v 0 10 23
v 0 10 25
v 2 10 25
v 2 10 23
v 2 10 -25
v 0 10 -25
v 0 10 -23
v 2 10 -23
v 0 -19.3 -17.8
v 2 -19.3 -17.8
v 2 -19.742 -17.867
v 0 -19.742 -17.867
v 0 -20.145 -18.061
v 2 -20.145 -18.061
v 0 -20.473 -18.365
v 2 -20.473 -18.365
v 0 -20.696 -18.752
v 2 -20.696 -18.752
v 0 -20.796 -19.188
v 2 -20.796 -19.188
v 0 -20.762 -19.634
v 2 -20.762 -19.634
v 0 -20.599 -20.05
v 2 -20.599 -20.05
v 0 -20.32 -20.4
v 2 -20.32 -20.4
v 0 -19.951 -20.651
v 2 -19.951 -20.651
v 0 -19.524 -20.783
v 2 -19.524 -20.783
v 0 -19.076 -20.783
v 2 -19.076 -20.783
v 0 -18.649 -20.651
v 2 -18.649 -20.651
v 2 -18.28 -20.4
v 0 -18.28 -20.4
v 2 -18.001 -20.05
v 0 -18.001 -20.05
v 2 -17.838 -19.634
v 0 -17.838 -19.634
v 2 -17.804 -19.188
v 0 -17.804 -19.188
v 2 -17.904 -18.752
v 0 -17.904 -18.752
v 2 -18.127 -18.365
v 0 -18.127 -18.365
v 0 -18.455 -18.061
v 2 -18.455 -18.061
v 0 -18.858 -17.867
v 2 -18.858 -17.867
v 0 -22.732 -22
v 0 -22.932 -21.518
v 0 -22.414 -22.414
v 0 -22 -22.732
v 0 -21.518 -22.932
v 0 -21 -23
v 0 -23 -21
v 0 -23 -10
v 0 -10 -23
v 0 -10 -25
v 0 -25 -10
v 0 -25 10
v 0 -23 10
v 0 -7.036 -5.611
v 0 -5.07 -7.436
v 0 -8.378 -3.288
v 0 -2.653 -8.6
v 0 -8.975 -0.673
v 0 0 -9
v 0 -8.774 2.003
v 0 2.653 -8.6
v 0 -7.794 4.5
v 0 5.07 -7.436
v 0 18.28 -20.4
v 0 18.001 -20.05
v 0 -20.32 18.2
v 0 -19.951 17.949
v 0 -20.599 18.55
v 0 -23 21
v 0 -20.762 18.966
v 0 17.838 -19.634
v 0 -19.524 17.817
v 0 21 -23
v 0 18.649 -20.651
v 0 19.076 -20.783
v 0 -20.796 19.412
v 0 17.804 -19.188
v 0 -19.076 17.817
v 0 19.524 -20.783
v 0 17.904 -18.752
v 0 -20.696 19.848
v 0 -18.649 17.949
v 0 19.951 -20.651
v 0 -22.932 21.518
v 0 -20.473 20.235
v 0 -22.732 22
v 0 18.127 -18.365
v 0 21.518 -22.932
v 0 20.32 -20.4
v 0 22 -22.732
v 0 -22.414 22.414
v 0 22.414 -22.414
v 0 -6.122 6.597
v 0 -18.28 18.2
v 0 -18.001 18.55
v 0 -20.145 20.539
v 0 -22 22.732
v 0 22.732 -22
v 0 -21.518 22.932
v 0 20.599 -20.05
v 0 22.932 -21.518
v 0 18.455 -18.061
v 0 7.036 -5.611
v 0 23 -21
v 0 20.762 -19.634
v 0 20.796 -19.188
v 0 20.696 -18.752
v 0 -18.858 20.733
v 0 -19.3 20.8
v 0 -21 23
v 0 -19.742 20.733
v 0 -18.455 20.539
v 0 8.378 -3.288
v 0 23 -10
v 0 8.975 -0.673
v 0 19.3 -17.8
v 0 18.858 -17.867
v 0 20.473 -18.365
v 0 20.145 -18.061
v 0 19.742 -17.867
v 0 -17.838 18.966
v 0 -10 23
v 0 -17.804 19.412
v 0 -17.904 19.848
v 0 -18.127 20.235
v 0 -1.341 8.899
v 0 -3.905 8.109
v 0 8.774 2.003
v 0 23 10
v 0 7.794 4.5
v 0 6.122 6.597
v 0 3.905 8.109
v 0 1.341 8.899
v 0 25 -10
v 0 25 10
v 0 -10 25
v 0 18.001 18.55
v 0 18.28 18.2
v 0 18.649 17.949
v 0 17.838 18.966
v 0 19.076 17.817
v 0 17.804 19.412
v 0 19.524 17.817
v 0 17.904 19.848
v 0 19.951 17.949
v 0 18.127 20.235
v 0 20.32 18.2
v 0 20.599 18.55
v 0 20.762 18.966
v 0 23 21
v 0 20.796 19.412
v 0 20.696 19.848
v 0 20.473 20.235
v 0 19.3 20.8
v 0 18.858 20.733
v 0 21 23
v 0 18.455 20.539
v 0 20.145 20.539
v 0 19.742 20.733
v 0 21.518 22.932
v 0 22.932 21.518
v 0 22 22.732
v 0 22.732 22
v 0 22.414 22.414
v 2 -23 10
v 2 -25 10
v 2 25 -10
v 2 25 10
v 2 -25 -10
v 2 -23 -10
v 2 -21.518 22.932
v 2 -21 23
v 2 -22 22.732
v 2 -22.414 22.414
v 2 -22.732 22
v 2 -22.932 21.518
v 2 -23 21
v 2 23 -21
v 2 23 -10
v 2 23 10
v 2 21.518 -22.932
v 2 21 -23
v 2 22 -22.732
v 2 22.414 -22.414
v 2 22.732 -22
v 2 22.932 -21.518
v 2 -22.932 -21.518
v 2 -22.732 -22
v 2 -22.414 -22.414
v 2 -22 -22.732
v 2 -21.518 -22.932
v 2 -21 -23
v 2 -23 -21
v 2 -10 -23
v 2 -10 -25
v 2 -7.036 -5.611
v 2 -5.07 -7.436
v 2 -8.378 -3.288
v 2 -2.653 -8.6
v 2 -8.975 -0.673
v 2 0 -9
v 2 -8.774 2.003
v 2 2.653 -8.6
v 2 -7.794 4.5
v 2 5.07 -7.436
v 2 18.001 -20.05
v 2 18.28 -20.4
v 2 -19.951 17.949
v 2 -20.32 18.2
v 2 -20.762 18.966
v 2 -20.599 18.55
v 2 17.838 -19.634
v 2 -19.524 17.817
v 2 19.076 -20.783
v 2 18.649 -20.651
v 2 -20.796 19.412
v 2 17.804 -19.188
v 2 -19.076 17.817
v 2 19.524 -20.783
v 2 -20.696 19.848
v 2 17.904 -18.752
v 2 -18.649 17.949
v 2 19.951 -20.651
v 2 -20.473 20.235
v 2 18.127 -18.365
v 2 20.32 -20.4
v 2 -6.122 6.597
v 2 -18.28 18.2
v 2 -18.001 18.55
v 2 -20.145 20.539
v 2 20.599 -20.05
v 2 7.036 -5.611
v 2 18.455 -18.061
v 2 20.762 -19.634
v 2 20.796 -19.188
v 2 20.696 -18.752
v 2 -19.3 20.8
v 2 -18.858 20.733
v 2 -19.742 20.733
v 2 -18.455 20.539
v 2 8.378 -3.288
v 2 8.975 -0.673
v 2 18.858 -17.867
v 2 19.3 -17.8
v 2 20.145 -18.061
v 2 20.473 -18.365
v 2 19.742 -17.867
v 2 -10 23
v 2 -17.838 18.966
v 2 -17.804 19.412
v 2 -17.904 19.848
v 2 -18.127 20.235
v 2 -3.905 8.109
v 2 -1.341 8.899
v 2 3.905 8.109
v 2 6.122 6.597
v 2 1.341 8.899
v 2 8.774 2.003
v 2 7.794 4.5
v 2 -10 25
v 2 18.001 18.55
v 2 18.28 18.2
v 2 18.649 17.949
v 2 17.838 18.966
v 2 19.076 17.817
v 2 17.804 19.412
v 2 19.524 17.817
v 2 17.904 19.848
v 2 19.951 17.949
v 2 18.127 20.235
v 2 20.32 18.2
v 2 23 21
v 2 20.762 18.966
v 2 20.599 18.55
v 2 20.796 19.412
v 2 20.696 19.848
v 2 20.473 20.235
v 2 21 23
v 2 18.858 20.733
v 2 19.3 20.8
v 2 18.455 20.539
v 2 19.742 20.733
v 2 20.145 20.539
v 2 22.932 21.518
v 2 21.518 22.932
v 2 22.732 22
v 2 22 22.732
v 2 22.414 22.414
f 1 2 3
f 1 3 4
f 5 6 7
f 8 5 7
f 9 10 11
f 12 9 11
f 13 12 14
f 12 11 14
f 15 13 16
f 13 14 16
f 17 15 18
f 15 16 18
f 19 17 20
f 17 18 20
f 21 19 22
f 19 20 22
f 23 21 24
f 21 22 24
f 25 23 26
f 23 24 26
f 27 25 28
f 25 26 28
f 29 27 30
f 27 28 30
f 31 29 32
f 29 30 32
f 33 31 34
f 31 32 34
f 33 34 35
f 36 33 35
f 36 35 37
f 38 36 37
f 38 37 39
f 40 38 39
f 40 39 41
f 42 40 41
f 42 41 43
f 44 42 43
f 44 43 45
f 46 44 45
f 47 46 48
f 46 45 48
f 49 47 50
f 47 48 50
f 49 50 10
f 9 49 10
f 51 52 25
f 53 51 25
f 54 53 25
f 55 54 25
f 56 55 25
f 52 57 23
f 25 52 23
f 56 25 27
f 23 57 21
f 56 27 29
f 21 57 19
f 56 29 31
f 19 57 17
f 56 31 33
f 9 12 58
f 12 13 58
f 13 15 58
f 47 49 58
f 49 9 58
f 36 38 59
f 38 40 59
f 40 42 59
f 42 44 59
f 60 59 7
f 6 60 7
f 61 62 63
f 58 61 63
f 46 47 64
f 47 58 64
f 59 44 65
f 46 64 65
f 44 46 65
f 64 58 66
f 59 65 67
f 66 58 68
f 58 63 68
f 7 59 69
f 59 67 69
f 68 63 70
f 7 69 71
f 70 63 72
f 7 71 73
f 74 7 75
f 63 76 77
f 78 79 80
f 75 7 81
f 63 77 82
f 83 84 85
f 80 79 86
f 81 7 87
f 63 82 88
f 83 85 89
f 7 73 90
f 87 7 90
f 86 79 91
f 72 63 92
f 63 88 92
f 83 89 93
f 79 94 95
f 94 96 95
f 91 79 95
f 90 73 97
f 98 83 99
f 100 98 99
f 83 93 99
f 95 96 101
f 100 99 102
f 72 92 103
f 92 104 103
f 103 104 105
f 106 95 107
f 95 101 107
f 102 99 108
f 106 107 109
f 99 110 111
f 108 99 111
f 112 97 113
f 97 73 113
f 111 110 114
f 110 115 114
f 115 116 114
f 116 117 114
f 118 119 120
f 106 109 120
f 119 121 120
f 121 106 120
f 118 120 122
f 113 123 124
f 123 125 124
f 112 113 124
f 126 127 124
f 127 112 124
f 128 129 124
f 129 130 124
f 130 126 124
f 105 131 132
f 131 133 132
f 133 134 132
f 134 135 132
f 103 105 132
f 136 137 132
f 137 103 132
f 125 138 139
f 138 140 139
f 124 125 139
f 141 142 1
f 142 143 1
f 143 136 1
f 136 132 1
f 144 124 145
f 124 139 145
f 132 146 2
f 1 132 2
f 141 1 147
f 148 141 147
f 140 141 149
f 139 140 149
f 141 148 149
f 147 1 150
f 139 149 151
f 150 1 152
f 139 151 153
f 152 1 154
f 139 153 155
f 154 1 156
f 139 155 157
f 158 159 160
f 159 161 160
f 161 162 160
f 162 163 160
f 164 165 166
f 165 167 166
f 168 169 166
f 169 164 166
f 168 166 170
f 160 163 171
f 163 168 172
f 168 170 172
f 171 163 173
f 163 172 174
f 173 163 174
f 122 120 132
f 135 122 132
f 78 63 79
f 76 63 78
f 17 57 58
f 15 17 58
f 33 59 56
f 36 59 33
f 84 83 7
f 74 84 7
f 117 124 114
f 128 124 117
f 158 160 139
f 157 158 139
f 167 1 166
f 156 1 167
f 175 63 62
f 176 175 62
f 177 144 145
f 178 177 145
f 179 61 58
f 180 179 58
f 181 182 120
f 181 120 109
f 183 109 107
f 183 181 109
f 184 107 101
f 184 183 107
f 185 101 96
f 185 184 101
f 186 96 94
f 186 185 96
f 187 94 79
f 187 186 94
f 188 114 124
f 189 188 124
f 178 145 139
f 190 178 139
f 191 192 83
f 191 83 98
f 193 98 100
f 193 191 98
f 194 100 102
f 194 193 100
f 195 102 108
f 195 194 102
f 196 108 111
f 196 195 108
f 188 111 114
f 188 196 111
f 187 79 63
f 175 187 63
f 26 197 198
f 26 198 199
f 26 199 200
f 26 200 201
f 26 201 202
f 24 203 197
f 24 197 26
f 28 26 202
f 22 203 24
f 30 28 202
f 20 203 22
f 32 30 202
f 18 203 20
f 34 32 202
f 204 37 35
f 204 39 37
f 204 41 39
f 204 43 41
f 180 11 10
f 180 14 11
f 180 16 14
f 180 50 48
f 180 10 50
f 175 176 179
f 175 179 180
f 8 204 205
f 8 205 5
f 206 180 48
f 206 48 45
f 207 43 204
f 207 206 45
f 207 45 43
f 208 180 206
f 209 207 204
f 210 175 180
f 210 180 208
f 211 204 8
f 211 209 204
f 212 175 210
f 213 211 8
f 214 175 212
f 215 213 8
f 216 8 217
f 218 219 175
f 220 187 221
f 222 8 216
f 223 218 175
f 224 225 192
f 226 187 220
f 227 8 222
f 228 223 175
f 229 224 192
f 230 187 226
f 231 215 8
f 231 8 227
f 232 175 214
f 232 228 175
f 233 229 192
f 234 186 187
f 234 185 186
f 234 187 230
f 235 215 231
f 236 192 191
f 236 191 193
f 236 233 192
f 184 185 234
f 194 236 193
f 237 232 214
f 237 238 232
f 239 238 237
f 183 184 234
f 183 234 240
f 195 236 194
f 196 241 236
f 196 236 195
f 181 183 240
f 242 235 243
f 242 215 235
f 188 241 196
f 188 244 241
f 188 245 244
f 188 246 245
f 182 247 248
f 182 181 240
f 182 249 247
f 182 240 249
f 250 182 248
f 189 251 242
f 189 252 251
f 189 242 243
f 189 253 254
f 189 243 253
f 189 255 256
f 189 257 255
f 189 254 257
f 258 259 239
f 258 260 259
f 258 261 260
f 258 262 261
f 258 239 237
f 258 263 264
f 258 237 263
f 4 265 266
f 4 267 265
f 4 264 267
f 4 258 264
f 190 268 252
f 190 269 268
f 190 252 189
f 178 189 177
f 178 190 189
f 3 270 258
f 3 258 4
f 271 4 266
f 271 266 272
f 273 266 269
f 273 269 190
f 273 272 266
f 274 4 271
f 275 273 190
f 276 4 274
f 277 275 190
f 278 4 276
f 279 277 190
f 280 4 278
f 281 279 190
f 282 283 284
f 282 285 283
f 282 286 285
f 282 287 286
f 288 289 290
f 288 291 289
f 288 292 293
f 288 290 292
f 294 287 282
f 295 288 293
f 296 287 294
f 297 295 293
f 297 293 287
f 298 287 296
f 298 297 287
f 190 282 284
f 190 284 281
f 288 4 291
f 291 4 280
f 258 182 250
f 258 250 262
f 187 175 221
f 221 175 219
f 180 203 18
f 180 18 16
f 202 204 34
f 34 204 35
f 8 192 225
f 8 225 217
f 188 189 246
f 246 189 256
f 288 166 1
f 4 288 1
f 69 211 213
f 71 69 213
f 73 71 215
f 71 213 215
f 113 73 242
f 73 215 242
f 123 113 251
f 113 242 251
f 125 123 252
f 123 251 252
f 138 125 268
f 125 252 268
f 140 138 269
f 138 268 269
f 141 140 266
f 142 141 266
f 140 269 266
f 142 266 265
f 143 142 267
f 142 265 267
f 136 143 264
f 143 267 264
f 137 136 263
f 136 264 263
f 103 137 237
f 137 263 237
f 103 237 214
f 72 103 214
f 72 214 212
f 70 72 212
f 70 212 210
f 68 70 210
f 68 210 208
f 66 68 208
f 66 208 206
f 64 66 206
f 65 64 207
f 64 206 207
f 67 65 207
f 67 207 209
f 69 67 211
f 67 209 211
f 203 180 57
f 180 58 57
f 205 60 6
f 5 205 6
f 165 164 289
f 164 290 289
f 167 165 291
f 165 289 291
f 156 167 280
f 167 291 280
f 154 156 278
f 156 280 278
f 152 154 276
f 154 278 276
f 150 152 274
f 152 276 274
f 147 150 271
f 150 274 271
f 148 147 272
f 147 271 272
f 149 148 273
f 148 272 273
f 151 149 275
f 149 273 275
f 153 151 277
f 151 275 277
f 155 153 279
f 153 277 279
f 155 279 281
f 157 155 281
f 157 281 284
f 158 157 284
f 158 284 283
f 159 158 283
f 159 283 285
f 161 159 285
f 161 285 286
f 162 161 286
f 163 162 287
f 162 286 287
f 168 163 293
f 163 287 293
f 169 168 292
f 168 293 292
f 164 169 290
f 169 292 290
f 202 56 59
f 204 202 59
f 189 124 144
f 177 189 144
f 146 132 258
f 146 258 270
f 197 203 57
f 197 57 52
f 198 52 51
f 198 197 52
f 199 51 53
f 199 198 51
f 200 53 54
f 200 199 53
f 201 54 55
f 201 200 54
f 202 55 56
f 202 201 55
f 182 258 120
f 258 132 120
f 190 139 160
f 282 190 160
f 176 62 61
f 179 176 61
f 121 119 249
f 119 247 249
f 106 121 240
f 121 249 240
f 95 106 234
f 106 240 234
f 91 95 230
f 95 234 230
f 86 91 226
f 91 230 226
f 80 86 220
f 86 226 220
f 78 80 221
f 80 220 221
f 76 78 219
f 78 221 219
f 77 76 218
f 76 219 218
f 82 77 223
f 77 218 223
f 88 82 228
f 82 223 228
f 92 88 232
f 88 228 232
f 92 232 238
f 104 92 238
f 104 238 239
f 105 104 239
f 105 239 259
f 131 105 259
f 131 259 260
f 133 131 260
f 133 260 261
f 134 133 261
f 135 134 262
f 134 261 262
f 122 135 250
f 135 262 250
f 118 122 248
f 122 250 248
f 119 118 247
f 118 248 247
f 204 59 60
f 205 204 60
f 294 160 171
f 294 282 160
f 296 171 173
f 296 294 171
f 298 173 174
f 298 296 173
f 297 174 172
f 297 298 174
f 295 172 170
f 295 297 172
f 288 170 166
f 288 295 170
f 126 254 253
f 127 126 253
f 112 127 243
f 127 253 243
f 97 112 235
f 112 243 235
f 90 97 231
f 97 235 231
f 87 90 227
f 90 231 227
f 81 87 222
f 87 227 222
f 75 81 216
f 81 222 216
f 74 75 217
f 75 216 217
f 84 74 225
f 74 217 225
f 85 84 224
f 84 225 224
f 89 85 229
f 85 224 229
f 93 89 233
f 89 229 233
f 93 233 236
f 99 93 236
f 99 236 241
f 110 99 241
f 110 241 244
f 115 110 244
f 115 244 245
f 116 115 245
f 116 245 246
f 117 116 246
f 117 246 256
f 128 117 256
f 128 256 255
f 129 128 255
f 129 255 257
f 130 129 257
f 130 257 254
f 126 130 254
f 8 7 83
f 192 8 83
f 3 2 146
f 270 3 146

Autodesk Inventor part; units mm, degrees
ref_plane "YZ Plane" through (0, 0, 0) normal (1, 0, 0) x (0, 1, 0)
ref_plane "XZ Plane" through (0, 0, 0) normal (0, 1, 0) x (-1, 0, 0)
ref_plane "XY Plane" through (0, 0, 0) normal (0, 0, 1) x (1, 0, 0)
sketch "Sketch1" plane through (0, 0, 0) normal (1, 0, 0) x (0, 1, 0)
  line L0 (-25, -25) -> (25, -25)
  line L1 (25, -25) -> (25, 25)
  line L2 (25, 25) -> (-25, 25)
  line L3 (-25, 25) -> (-25, -25)
  line L4 (-25, -25) -> (25, 25) construction
  line L5 (25, -25) -> (-25, 25) construction
  line L6 (-24, -24) -> (24, -24)
  line L7 (24, -24) -> (24, 24)
  line L8 (24, 24) -> (-24, 24)
  line L9 (-24, 24) -> (-24, -24)
  line L10 (-24, -24) -> (24, 24) construction
  line L11 (24, -24) -> (-24, 24) construction
  point P0 (0, 0)
  dimension "d0" = 50
  dimension "d1" = 50
  dimension "d2" = 48
  dimension "d3" = 48
extrude "Extrusion1" add sketch "Sketch1" along normal blind 2 contours L3 L2 L1 L0 | L9 L8 L7 L6
sketch "Sketch3" plane through (0, 0, 0) normal (-1, 0, 0) x (0, 0, 1)
  line L0 (19.3, -19.3) -> (-19.3, -19.3)
  line L1 (-19.3, -19.3) -> (-19.3, 19.3)
  line L2 (-19.3, 19.3) -> (19.3, 19.3)
  line L3 (19.3, 19.3) -> (19.3, -19.3)
  line L4 (19.3, -19.3) -> (-19.3, 19.3) construction
  line L5 (-19.3, -19.3) -> (19.3, 19.3) construction
  circle A0 centre (-19.3, 19.3) radius 1.5
  circle A1 centre (19.3, 19.3) radius 1.5555
  circle A2 centre (19.3, -19.3) radius 1.5555
  circle A3 centre (-19.3, -19.3) radius 1.5555
  point P0 (0, 0)
  dimension "d6" = 38.6
  dimension "d7" = 38.6
  dimension "d8" = 3
  dimension "d9" = 3.111
  dimension "d10" = 3.111
  dimension "d11" = 3.111
hole "Hole1" at (0, 19.3, -19.3) direction (1, 0, 0) diameter 3 end through all
sketch "Sketch4" plane through (0, 0, 0) normal (-1, 0, 0) x (0, 0, 1)
  line L0 (-19.3, -19.3) -> (19.3, -19.3)
  line L1 (19.3, -19.3) -> (19.3, 19.3)
  line L2 (19.3, 19.3) -> (-19.3, 19.3)
  line L3 (-19.3, 19.3) -> (-19.3, -19.3)
  line L4 (-19.3, -19.3) -> (19.3, 19.3) construction
  line L5 (19.3, -19.3) -> (-19.3, 19.3) construction
  circle A0 centre (19.3, 19.3) radius 1.5
  point P0 (0, 0)
  dimension "d19" = 38.6
  dimension "d20" = 38.6
  dimension "d21" = 3
hole "Hole2" at (0, 19.3, 19.3) direction (1, 0, 0) diameter 3 end through all
sketch "Sketch5" plane through (0, 0, 0) normal (-1, 0, 0) x (0, 0, 1)
  line L0 (19.3, -19.3) -> (-19.3, -19.3)
  line L1 (-19.3, -19.3) -> (-19.3, 19.3)
  line L2 (-19.3, 19.3) -> (19.3, 19.3)
  line L3 (19.3, 19.3) -> (19.3, -19.3)
  line L4 (19.3, -19.3) -> (-19.3, 19.3) construction
  line L5 (-19.3, -19.3) -> (19.3, 19.3) construction
  circle A0 centre (-19.3, -19.3) radius 1.5
  point P0 (0, 0)
  dimension "d29" = 38.6
  dimension "d30" = 38.6
  dimension "d31" = 3
hole "Hole3" at (0, -19.3, -19.3) direction (1, 0, 0) diameter 3 end through all
sketch "Sketch6" plane through (0, 0, 0) normal (-1, 0, 0) x (0, 0, 1)
  line L0 (19.3, -19.3) -> (-19.3, -19.3)
  line L1 (-19.3, -19.3) -> (-19.3, 19.3)
  line L2 (-19.3, 19.3) -> (19.3, 19.3)
  line L3 (19.3, 19.3) -> (19.3, -19.3)
  line L4 (19.3, -19.3) -> (-19.3, 19.3) construction
  line L5 (-19.3, -19.3) -> (19.3, 19.3) construction
  circle A0 centre (19.3, -19.3) radius 1.5
  point P0 (0, 0)
  dimension "d39" = 38.6
  dimension "d40" = 38.6
  dimension "d41" = 3
hole "Hole4" at (0, -19.3, 19.3) direction (1, 0, 0) diameter 3 end through all
sketch "Sketch7" plane through (0, 0, 0) normal (-1, 0, 0) x (0, 0, 1)
  line L0 (23, -23) -> (-23, -23)
  line L1 (-23, -23) -> (-23, 23)
  line L2 (-23, 23) -> (23, 23)
  line L3 (23, 23) -> (23, -23)
  line L4 (23, -23) -> (-23, 23) construction
  line L5 (-23, -23) -> (23, 23) construction
  line L6 (-25, 25) -> (25, 25) projected
  line L7 (10, 21) -> (-10, 21)
  line L8 (-10, 21) -> (-10, 25)
  line L9 (-10, 25) -> (10, 25)
  line L10 (10, 25) -> (10, 21)
  line L11 (10, 21) -> (-10, 25) construction
  line L12 (-10, 21) -> (10, 25) construction
  line L13 (21, -10) -> (25, -10)
  line L14 (25, -10) -> (25, 10)
  line L15 (25, 10) -> (21, 10)
  line L16 (21, 10) -> (21, -10)
  line L17 (21, -10) -> (25, 10) construction
  line L18 (25, -10) -> (21, 10) construction
  line L19 (25, -25) -> (-25, -25) projected
  line L20 (-10, -21) -> (10, -21)
  line L21 (10, -21) -> (10, -25)
  line L22 (10, -25) -> (-10, -25)
  line L23 (-10, -25) -> (-10, -21)
  line L24 (-10, -21) -> (10, -25) construction
  line L25 (10, -21) -> (-10, -25) construction
  line L26 (-25.0252, 10) -> (-20.9748, 10)
  line L27 (-20.9748, 10) -> (-20.9748, -10)
  line L28 (-20.9748, -10) -> (-25.0252, -10)
  line L29 (-25.0252, -10) -> (-25.0252, 10)
  line L30 (-25.0252, 10) -> (-20.9748, -10) construction
  line L31 (-20.9748, 10) -> (-25.0252, -10) construction
  line L32 (25, -25) -> (-25, -25)
  line L33 (-25, -25) -> (-25, 25)
  line L34 (-25, 25) -> (25, 25)
  line L35 (25, 25) -> (25, -25)
  line L36 (25, -25) -> (-25, 25) construction
  line L37 (-25, -25) -> (25, 25) construction
  point P0 (0, 0)
  point P1 (0, 23)
  point P2 (23, 0)
  point P3 (0, -23)
  point P4 (-23, 0)
  point P5 (-10, 23)
  point P6 (10, 23)
  point P7 (23, 10)
  point P8 (23, -10)
  point P9 (10, -23)
  point P10 (-10, -23)
  point P11 (-23, -10)
  point P12 (-23, 10)
  point P13 (10, 25)
  point P14 (-25, 10)
  point P15 (-25, -10)
  point P16 (-10, -25)
  dimension "d49" = 46
  dimension "d50" = 46
  dimension "d51" = 20
  dimension "d52" = 20
  dimension "d53" = 20
  dimension "d54" = 20
extrude "Extrusion3" cut sketch "Sketch7" against normal blind 2 contours L3 L13 L35 L19 L21 L0 | L23 L19 L33 L28 L1 L0 | L3 L2 L10 L6 L35 L15 | L26 L33 L6 L8 L2 L1
sketch "Sketch8" plane through (2, 0, 0) normal (1, 0, 0) x (0, 0, -1)
  circle A0 centre (0, 0) radius 9
  dimension "d59" = 18
extrude "Extrusion4" cut sketch "Sketch8" against normal blind 2
sketch "Sketch9" plane through (2, 0, 0) normal (1, 0, 0) x (0, 0, -1)
  line L0 (13.75, -13.75) -> (-13.75, -13.75)
  line L1 (-13.75, -13.75) -> (-13.75, 13.75)
  line L2 (-13.75, 13.75) -> (13.75, 13.75)
  line L3 (13.75, 13.75) -> (13.75, -13.75)
  line L4 (13.75, -13.75) -> (-13.75, 13.75) construction
  line L5 (-13.75, -13.75) -> (13.75, 13.75) construction
  circle A0 centre (-13.75, 13.75) radius 1
  circle A1 centre (13.75, 13.75) radius 1
  circle A2 centre (13.75, -13.75) radius 1
  circle A3 centre (-13.75, -13.75) radius 1
  point P0 (0, 0)
  dimension "d62" = 27.5
  dimension "d63" = 27.5
  dimension "d64" = 2
  dimension "d65" = 2
  dimension "d66" = 2
  dimension "d67" = 2
extrude "Extrusion5" [suppressed]
fillet "Fillet1" radius 2 4 edges at (1, 23, 23) (1, -23, 23) (1, -23, -23) (1, 23, -23)
properties part number "UpperSide" material "Aluminum 6061, Welded"
